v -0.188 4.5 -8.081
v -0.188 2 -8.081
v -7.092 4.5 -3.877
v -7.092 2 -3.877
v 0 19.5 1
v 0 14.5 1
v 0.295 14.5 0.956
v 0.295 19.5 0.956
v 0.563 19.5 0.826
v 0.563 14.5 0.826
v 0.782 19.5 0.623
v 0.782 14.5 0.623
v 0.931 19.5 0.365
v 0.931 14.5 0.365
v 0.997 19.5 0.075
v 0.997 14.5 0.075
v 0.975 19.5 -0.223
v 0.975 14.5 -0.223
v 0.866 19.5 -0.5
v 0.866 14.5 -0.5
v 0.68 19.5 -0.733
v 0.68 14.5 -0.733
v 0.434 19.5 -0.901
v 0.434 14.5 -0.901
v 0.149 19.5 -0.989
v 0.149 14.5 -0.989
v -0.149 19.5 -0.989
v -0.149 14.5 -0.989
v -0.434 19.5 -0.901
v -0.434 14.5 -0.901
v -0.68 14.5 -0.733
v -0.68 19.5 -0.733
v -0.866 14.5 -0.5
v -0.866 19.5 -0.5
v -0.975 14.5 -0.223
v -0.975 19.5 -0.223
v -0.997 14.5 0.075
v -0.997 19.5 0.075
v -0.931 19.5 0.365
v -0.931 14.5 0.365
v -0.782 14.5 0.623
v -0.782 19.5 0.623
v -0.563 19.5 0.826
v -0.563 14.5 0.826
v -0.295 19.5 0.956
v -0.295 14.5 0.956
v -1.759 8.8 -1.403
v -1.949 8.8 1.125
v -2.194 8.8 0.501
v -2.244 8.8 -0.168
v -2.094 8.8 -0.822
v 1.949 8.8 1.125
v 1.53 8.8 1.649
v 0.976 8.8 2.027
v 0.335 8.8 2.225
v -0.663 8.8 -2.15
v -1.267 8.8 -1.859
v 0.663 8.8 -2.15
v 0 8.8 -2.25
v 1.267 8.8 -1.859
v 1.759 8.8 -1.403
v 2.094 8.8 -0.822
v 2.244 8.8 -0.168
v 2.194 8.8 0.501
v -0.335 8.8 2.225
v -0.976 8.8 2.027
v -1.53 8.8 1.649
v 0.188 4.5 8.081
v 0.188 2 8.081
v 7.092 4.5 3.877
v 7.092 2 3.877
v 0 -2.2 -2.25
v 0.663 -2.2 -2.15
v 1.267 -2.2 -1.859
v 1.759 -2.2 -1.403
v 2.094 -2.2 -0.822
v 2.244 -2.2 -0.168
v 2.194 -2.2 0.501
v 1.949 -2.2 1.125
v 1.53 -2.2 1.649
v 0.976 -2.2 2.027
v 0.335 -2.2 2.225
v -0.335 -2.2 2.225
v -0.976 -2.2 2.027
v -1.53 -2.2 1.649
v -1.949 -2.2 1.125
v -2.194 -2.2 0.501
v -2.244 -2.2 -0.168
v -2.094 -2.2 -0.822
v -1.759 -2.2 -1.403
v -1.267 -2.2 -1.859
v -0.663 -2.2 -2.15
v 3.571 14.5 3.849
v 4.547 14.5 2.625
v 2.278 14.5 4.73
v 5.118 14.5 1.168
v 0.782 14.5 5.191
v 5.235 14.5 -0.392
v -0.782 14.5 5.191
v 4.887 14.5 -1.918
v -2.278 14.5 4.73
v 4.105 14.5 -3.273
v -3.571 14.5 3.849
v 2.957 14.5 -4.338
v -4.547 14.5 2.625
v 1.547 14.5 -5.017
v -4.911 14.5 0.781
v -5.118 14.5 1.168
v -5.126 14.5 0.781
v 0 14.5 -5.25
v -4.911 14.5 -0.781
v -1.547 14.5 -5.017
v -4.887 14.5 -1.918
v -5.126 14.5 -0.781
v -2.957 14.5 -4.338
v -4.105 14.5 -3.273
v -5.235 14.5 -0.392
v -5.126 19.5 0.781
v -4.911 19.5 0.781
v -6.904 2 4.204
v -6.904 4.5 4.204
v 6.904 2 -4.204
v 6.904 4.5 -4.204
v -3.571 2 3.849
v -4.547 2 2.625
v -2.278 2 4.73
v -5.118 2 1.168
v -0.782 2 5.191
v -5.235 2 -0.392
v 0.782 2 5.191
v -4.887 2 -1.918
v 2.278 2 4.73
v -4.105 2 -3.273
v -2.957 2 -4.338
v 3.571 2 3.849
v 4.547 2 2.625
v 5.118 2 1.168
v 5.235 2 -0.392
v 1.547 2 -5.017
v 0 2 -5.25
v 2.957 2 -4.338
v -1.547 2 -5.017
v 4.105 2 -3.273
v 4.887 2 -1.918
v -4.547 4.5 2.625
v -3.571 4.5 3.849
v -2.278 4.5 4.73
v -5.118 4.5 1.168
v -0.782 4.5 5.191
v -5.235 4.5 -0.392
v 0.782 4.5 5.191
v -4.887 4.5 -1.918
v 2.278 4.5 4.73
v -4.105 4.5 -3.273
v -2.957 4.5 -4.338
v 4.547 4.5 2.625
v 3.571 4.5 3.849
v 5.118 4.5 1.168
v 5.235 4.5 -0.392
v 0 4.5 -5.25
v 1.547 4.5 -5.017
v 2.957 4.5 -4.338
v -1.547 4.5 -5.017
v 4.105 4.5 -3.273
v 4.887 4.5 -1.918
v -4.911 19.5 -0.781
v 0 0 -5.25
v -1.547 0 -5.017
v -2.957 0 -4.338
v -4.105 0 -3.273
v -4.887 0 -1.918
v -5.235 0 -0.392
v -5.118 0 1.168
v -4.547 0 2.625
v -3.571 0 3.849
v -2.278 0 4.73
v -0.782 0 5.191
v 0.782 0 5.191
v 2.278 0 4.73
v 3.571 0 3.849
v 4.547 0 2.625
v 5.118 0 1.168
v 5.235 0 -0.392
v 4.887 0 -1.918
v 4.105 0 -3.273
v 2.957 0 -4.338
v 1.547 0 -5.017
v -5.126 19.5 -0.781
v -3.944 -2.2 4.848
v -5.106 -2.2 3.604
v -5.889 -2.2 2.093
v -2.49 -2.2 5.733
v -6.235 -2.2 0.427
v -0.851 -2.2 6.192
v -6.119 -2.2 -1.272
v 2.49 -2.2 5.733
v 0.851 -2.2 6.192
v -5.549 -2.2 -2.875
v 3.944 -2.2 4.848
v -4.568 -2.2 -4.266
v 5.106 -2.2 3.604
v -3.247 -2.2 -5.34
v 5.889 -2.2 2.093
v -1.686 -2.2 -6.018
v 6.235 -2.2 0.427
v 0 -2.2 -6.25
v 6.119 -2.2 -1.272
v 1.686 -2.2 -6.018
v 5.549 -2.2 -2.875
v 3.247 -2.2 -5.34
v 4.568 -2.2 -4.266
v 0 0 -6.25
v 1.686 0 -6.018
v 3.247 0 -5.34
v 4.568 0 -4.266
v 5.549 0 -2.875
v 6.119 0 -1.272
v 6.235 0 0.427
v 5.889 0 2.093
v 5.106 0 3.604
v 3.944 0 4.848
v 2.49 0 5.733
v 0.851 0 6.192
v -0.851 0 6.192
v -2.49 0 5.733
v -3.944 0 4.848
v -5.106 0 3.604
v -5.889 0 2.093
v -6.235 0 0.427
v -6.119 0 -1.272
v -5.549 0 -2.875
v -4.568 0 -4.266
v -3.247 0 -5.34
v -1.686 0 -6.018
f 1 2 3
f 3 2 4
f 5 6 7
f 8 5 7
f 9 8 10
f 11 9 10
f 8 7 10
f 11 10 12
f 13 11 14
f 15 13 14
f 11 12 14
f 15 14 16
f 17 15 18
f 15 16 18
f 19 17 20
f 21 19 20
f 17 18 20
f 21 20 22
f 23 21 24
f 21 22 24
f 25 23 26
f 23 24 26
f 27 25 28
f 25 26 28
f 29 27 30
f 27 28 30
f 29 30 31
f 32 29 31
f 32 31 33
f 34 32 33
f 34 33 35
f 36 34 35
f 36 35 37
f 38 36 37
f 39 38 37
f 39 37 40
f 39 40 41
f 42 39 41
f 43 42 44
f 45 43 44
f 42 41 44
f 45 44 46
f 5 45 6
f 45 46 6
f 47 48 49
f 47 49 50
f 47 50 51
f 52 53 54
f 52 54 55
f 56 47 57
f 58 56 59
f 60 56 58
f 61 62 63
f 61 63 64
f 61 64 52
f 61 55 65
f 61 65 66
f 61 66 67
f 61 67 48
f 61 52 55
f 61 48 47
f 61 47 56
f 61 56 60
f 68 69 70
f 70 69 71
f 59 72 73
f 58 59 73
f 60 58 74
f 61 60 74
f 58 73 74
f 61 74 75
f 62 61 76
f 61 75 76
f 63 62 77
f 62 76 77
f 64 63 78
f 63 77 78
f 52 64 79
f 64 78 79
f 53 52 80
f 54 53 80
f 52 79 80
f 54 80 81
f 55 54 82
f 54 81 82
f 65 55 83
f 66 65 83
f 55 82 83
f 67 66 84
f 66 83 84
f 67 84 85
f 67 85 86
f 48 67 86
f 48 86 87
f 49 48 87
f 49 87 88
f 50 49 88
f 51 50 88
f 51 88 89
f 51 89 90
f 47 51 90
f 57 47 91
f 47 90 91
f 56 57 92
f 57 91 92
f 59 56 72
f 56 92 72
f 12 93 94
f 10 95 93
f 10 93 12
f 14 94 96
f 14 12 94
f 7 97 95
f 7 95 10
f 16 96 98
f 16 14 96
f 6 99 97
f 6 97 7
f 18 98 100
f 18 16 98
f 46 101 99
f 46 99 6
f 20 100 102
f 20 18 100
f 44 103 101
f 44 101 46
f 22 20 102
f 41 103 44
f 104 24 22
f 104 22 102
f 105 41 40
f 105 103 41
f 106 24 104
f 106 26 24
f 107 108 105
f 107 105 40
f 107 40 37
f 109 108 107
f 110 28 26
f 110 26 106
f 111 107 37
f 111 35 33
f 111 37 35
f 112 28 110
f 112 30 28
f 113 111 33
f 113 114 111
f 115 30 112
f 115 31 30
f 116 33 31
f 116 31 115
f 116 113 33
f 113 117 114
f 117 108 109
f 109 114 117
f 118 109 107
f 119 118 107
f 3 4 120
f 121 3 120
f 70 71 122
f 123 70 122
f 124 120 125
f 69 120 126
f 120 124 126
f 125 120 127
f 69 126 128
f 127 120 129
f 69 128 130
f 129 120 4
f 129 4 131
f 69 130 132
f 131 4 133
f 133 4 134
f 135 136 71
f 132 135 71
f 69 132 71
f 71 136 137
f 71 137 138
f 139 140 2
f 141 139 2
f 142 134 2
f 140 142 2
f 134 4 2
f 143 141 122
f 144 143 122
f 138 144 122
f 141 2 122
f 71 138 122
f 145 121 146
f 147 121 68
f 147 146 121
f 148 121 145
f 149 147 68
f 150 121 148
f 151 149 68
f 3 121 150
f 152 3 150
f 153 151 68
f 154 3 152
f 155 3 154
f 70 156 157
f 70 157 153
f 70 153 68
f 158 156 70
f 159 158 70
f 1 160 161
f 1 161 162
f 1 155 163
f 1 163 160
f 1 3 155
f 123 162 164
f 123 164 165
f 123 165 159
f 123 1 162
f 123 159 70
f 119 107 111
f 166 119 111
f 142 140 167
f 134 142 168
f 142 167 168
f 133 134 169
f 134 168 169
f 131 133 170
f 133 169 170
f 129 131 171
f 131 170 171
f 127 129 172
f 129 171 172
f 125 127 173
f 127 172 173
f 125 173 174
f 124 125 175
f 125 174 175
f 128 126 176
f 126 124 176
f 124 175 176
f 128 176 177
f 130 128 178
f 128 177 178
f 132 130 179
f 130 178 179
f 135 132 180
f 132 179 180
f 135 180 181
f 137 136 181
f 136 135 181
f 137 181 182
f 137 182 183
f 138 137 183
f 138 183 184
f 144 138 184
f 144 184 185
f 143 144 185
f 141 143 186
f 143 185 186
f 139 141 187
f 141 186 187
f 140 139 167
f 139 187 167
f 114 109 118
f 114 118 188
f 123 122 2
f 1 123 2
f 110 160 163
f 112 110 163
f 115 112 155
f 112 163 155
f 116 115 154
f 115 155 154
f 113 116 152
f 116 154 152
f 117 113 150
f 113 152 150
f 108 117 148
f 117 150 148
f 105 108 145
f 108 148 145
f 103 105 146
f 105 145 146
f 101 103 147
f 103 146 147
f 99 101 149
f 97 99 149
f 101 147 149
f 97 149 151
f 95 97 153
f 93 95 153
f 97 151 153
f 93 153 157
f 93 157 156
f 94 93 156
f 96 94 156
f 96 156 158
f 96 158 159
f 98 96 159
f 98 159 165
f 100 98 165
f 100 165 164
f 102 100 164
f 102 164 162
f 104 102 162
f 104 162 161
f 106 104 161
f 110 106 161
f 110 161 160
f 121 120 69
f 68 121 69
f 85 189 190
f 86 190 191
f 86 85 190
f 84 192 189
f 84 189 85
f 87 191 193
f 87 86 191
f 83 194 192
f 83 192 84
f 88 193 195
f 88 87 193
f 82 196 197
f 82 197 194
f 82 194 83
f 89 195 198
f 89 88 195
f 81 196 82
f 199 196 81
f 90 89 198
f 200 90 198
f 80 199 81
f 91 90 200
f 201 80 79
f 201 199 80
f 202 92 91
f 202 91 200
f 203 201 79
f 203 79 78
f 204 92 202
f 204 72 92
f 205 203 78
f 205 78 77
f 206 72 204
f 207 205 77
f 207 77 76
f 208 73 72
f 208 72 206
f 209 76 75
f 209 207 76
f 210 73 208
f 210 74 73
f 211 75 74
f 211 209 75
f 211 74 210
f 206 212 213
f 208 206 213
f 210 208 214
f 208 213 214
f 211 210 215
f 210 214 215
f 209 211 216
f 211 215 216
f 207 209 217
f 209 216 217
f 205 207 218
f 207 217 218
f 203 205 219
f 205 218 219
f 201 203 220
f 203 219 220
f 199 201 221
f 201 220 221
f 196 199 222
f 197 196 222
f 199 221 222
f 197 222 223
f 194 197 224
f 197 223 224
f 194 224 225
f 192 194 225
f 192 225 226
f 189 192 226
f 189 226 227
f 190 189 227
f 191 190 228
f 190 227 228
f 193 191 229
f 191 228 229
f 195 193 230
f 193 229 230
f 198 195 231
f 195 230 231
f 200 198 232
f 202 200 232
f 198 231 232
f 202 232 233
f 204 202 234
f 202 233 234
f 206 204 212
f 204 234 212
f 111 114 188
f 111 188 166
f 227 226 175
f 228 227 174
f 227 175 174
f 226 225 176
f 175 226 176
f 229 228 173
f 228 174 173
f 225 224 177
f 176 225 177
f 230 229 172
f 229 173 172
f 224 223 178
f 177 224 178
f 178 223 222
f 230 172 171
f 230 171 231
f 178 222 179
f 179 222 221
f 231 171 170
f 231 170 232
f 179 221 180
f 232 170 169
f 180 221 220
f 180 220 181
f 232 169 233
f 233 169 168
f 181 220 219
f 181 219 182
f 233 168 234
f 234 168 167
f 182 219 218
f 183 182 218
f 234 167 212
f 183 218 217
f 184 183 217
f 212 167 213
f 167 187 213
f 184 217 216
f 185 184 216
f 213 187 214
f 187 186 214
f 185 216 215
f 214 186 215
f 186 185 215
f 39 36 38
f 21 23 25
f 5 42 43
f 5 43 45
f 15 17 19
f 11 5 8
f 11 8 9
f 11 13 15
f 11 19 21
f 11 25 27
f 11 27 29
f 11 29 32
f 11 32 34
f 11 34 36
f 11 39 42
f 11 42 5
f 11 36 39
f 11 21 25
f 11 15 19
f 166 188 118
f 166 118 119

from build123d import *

# Parameters (mm, degrees)
SKETCH_1_R          = 5.25
EXTRUDE_1_DEPTH     = 14.5
SKETCH_2_R          = 1
SKETCH_2_W          = 0.21481542
SKETCH_2_H          = 1.562293966
EXTRUDE_2_DEPTH     = 5
SKETCH_3_R          = 6.25
EXTRUDE_3_DEPTH     = 2.2
EXTRUDE_START       = 2
EXTRUDE_4_DEPTH     = 2.5
SKETCH_5_R          = 2.25
CUT_EXTRUDE_1_DEPTH = 11


with BuildPart() as part:
    # Эскиз1 → Бобышка-Вытянуть1 (new body)
    with BuildSketch(Plane(origin=(0, 0, 0), x_dir=(1, 0, 0), z_dir=(0, 1, 0))):
        with Locations(Location((0, 0, 0), (0, 0, 90))):
            Circle(SKETCH_1_R)
    extrude(amount=EXTRUDE_1_DEPTH)

    # Эскиз2 → Бобышка-Вытянуть2 (add)
    with BuildSketch(Plane(origin=(0, 14.5, 0), x_dir=(1, 0, 0), z_dir=(0, 1, 0))):
        with Locations(Location((0, 0, 0), (0, 0, 270))):
            Circle(SKETCH_2_R)
        with Locations((-5.018869364, 0)):
            Rectangle(SKETCH_2_W, SKETCH_2_H)
    extrude(amount=EXTRUDE_2_DEPTH)

    # Эскиз3 → Бобышка-Вытянуть3 (add)
    with BuildSketch(Plane.XZ):
        with Locations(Location((0, 0, 0), (0, 0, 270))):
            Circle(SKETCH_3_R)
    extrude(amount=EXTRUDE_3_DEPTH)

    # Эскиз4 → Бобышка-Вытянуть4 (add)
    with BuildSketch(Plane(origin=(0, 0, 0), x_dir=(1, 0, 0), z_dir=(0, 1, 0)).offset(EXTRUDE_START)):
        Polygon((7.092328416, -3.877139534), (6.903865539, 4.203566813), (-0.188462877, 8.080706348), (-7.092328416, 3.877139534), (-6.903865539, -4.203566813), (0.188462877, -8.080706348), align=None)
    extrude(amount=EXTRUDE_4_DEPTH)

    # Эскиз5 → Вырез-Вытянуть1 (cut)
    with BuildSketch(Plane.XZ.offset(2.2)):
        with Locations(Location((0, 0, 0), (0, 0, 270))):
            Circle(SKETCH_5_R)
    extrude(amount=-CUT_EXTRUDE_1_DEPTH, mode=Mode.SUBTRACT)


solid = part.part
